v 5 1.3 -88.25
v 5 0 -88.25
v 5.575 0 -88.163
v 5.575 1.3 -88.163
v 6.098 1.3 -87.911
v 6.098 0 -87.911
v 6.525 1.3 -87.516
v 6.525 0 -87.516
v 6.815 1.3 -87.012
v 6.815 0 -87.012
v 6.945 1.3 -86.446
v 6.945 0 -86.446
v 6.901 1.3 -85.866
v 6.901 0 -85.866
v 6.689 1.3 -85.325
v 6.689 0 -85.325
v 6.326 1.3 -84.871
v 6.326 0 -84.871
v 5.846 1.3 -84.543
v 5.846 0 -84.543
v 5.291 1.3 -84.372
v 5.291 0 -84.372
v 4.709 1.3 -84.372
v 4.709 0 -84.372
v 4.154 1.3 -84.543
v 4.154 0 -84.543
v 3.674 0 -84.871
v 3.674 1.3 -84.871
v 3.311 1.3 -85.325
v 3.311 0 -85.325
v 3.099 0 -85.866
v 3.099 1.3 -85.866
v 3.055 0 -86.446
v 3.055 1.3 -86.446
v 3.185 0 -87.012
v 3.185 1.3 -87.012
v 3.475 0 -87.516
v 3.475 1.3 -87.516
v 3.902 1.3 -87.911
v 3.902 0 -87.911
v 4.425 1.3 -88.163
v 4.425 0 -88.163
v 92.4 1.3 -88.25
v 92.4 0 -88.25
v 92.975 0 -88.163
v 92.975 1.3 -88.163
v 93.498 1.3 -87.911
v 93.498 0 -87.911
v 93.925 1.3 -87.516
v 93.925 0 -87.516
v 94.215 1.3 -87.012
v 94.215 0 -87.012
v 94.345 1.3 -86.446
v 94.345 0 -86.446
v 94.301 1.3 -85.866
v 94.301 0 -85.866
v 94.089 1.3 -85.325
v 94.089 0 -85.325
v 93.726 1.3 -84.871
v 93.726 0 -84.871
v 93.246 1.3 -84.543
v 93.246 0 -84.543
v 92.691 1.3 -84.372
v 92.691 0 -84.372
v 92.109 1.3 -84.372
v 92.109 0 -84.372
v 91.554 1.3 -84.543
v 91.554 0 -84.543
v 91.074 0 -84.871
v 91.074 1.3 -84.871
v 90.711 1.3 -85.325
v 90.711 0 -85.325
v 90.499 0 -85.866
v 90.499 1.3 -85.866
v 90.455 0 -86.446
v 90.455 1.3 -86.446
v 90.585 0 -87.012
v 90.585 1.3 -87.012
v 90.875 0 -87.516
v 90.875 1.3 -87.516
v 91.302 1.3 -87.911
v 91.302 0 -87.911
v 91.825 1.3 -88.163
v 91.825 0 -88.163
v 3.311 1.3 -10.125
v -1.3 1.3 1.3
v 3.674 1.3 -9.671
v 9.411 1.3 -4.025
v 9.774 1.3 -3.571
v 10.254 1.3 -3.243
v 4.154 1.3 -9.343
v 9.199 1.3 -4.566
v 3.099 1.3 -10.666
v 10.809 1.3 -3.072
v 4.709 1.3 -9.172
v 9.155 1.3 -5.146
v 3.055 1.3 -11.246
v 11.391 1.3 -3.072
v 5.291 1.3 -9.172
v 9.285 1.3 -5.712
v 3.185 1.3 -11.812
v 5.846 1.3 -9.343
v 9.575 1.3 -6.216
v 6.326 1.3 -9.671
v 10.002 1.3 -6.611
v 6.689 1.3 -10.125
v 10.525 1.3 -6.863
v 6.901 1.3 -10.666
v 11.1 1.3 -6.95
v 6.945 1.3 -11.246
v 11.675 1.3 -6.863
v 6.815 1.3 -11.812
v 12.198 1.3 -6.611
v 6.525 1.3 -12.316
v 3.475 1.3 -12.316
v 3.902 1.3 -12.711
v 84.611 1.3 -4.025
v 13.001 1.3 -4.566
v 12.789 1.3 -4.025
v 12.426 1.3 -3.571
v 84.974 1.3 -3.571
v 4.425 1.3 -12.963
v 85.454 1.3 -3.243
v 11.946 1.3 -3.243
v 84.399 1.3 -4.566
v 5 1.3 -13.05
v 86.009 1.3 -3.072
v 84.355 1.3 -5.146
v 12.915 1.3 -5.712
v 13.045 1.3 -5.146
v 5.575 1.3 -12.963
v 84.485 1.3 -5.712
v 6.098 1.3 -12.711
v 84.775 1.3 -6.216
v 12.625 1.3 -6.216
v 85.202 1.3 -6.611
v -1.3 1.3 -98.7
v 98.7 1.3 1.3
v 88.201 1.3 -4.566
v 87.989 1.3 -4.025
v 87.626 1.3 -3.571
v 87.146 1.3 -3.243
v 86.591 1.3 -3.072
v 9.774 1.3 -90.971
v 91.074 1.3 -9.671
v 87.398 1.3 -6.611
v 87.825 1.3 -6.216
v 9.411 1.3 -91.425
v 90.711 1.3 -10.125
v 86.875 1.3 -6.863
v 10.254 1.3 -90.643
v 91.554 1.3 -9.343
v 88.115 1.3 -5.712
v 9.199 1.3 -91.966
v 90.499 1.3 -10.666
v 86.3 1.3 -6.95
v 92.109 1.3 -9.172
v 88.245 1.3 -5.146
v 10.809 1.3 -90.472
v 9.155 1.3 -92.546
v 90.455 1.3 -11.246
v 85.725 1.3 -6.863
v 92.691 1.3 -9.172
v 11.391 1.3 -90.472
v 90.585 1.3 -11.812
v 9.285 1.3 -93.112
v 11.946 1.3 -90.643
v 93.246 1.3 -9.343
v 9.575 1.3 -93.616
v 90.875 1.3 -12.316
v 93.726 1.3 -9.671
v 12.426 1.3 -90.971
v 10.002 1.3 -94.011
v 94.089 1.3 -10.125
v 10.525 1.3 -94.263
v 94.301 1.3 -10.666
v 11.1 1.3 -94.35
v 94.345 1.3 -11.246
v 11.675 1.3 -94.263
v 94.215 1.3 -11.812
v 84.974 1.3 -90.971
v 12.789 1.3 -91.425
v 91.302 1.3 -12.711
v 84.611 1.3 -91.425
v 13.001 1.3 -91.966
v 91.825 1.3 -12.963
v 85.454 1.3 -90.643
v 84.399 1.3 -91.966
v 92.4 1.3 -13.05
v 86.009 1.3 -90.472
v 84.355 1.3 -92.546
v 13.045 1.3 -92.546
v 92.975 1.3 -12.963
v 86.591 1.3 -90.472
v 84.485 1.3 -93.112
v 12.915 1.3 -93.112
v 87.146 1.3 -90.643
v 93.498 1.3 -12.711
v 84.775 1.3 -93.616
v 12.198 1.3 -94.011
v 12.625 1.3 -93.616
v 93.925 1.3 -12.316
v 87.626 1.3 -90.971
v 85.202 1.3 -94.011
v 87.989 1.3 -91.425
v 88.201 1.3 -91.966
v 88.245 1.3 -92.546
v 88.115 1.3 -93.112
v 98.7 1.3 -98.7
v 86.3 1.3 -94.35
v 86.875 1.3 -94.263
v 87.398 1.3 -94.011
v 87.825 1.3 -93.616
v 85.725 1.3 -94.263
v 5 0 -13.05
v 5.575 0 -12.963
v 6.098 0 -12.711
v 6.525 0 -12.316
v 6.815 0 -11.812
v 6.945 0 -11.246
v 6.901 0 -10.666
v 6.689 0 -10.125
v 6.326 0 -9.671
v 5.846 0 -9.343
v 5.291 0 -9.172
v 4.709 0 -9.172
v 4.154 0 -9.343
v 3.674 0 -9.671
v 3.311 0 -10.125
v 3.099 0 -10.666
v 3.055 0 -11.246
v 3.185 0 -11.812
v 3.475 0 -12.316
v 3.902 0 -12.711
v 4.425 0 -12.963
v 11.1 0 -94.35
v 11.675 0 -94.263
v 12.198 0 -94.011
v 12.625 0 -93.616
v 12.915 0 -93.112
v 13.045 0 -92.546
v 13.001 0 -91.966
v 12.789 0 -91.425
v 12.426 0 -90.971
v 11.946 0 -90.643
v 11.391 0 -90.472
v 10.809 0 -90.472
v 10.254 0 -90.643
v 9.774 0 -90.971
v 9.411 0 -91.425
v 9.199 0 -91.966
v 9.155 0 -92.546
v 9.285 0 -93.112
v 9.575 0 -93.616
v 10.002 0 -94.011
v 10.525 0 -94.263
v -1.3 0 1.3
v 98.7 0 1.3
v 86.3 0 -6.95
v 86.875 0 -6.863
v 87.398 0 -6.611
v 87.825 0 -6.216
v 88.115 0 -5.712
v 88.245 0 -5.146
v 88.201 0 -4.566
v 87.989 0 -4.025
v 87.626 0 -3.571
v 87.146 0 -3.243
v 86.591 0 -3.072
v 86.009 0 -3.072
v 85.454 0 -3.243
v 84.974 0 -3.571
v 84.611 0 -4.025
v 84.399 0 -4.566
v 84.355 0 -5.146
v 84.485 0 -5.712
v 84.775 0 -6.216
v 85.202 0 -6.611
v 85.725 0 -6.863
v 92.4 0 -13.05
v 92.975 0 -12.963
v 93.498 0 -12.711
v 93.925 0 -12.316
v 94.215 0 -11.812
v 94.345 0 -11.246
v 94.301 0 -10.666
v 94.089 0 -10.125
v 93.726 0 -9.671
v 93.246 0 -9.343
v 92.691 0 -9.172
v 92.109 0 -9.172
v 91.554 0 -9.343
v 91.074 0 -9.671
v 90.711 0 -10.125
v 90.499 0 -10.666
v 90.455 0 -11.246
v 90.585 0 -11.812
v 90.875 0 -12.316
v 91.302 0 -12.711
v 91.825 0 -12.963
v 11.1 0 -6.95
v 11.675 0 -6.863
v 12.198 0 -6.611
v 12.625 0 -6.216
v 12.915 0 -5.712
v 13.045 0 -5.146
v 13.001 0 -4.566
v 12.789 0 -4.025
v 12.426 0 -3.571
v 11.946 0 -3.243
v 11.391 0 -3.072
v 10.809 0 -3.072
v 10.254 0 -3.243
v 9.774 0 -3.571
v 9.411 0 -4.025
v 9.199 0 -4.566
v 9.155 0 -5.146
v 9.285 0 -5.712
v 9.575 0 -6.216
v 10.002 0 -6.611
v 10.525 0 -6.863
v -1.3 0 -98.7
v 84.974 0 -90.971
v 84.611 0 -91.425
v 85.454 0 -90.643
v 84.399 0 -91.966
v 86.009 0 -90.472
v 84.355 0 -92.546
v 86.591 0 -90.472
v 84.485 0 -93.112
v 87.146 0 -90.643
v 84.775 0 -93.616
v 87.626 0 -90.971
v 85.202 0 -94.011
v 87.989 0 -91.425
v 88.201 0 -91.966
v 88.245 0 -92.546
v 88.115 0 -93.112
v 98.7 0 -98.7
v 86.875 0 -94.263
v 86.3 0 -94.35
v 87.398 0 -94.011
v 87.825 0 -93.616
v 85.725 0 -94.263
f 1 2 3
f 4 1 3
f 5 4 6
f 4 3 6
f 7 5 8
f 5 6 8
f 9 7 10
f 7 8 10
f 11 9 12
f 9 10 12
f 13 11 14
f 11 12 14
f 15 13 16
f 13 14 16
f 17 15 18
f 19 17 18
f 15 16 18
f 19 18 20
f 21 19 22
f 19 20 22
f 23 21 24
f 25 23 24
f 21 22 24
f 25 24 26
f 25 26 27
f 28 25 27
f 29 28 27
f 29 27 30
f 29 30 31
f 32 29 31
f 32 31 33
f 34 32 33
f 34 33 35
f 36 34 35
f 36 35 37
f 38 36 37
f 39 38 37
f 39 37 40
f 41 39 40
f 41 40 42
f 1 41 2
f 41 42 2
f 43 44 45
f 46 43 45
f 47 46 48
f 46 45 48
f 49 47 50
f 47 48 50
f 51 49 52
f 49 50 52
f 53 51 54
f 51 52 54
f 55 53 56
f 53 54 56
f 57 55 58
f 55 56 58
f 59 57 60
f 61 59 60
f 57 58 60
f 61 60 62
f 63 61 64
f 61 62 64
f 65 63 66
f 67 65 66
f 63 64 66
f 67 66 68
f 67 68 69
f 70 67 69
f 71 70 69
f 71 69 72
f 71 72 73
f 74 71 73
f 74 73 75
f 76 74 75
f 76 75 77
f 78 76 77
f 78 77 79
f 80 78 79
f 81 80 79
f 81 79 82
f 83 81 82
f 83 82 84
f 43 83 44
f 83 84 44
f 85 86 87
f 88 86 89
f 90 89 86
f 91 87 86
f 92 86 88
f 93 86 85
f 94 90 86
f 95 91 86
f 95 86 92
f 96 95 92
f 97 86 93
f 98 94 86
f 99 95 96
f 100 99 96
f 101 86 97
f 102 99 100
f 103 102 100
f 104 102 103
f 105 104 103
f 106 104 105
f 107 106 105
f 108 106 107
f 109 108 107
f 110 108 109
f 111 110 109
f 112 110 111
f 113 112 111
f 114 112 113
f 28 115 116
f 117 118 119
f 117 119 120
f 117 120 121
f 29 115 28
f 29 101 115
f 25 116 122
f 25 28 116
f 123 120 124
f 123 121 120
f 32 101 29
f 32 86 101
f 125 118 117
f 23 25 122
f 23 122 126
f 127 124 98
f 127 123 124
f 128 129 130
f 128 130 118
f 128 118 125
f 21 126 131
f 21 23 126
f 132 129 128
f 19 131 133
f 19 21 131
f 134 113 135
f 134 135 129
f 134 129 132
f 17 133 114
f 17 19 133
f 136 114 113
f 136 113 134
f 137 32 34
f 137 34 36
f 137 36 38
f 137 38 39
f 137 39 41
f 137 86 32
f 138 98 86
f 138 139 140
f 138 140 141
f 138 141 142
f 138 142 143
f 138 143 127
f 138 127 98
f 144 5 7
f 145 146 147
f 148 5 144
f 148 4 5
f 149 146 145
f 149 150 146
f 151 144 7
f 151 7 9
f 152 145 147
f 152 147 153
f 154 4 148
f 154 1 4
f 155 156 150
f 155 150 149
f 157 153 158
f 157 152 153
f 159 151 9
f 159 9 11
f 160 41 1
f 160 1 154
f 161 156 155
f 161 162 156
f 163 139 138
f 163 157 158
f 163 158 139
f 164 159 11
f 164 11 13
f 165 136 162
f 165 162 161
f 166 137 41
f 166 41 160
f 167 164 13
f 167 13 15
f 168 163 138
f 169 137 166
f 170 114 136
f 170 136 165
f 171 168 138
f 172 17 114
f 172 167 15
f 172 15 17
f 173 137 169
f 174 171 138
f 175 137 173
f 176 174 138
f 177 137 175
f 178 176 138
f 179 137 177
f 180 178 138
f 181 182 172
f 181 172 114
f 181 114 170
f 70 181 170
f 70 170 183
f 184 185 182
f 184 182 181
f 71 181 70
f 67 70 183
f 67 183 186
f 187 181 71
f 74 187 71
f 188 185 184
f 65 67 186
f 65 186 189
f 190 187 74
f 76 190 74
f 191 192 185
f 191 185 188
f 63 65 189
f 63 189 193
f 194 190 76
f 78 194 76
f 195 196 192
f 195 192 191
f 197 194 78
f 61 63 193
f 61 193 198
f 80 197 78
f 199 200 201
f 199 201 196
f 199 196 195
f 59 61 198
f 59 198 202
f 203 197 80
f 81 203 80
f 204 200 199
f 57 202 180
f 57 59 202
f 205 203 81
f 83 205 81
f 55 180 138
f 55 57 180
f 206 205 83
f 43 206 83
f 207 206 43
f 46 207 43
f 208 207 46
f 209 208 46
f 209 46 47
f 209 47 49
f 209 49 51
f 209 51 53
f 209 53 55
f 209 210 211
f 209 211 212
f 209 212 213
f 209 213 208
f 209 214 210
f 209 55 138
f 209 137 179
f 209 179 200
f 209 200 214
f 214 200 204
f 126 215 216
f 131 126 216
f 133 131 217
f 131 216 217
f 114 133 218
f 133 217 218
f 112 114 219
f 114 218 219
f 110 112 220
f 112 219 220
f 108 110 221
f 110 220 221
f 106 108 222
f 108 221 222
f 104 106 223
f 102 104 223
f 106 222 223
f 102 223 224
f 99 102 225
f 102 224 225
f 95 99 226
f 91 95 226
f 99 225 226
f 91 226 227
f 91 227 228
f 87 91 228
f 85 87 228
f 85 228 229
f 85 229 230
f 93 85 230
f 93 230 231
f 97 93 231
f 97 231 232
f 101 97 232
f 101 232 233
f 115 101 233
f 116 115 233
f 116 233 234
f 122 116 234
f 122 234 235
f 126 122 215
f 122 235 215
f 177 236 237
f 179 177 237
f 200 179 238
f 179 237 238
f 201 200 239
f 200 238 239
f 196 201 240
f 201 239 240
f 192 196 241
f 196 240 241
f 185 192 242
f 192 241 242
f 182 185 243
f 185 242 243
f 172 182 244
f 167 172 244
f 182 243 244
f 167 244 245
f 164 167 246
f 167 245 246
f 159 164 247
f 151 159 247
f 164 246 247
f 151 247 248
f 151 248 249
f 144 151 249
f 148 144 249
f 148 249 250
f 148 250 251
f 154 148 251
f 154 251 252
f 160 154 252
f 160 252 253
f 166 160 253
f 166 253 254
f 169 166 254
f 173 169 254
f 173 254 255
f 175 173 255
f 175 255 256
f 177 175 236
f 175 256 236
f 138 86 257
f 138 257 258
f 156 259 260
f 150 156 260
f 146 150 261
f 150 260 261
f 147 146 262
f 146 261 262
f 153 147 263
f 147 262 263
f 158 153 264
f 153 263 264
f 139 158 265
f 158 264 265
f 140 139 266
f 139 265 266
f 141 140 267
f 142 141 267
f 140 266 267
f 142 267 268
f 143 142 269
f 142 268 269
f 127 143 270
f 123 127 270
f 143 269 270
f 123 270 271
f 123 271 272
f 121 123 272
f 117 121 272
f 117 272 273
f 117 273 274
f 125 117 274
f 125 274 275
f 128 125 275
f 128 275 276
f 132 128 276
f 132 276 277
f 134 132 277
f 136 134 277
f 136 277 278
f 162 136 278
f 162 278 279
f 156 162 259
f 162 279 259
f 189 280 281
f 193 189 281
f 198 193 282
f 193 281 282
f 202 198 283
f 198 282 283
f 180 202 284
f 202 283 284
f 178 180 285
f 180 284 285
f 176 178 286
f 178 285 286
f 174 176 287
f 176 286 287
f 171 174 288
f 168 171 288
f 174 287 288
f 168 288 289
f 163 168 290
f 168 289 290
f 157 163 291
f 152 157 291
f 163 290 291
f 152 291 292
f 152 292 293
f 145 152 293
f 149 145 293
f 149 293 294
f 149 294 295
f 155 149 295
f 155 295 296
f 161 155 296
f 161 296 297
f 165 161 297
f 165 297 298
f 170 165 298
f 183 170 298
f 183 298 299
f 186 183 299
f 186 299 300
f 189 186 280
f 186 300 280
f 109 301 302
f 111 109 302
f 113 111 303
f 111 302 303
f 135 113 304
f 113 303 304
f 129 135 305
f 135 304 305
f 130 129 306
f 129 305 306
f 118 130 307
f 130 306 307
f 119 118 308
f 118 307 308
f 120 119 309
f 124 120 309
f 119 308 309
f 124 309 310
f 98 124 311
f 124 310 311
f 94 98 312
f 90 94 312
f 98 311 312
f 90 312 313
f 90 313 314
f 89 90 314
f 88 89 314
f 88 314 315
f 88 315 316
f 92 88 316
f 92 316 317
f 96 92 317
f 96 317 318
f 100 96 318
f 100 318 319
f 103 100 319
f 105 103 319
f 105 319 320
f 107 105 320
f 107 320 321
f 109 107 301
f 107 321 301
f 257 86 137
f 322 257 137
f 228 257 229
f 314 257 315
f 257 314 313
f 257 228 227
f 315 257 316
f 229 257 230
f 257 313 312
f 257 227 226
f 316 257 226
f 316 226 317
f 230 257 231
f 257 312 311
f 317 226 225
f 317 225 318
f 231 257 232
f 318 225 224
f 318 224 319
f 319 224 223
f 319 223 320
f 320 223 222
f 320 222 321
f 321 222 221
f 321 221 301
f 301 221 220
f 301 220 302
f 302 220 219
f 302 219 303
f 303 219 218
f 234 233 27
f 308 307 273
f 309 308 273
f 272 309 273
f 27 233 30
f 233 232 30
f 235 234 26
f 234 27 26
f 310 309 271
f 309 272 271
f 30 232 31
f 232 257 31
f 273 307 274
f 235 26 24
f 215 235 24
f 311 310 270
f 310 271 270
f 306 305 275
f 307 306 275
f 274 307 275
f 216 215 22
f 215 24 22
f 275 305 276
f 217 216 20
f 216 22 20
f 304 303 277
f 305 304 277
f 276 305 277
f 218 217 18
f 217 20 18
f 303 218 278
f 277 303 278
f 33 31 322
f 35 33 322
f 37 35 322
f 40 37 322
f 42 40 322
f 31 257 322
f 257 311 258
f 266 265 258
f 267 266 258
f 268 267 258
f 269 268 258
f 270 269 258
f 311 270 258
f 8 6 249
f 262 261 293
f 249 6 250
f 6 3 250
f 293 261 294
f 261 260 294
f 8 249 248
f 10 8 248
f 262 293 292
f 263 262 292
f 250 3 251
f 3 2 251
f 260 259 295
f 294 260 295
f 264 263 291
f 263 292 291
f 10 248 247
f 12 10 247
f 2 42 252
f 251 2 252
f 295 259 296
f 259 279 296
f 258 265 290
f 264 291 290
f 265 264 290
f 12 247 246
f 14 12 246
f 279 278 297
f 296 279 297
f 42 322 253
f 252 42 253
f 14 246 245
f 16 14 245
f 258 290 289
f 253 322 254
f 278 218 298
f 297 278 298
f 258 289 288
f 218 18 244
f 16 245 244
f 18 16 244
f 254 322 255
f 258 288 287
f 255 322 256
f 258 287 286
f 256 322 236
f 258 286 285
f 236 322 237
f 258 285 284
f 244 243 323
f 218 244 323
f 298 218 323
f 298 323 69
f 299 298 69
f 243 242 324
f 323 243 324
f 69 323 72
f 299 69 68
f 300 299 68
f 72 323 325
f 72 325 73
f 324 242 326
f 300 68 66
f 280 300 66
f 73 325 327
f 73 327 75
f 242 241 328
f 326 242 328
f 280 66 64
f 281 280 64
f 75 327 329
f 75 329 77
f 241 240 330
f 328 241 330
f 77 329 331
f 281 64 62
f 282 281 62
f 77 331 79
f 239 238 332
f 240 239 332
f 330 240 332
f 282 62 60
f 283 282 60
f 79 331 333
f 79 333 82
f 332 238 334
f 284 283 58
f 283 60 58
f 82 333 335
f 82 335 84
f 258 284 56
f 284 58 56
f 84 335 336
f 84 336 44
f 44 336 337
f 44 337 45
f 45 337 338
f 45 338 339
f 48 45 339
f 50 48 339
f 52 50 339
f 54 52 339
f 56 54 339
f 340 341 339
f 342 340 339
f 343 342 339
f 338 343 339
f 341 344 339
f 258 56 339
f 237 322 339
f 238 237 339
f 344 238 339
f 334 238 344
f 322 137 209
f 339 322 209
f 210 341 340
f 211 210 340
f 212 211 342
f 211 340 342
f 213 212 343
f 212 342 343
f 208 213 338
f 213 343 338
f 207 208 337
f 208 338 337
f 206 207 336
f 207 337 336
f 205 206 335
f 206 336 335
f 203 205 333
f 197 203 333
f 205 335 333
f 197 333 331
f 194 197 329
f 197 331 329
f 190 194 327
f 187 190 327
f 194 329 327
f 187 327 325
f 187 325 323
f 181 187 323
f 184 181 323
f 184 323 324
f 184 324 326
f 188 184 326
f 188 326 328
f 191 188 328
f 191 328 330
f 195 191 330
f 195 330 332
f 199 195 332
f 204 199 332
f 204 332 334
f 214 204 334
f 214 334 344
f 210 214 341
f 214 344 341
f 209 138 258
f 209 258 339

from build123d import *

# Parameters (mm, degrees)
BOSS_EXTRUDE1_DEPTH = 1.3
SKETCH3_W           = 100
SKETCH3_H           = 100
BOSS_EXTRUDE3_DEPTH = 1.3
SKETCH2_R           = 1.95
CUT_EXTRUDE1_DEPTH  = 1.3


with BuildPart() as part:
    # Sketch1 → Boss-Extrude1 (new body)
    with BuildSketch(Plane(origin=(0, 0, 0), x_dir=(1, 0, 0), z_dir=(0, 1, 0))):
        Polygon((7.2, 7.2), (7.2, 0), (90.2, 0), (90.2, 7.2), (97.4, 7.2), (97.4, 90.2), (90.2, 90.2), (90.2, 97.4), (7.2, 97.4), (7.2, 90.2), (0, 90.2), (0, 7.2), align=None)
    extrude(amount=BOSS_EXTRUDE1_DEPTH)

    # Sketch3 → Boss-Extrude3 (add)
    with BuildSketch(Plane(origin=(0, 1.3, 0), x_dir=(1, 0, 0), z_dir=(0, 1, 0))):
        with Locations((48.7, 48.7)):
            Rectangle(SKETCH3_W, SKETCH3_H)
    extrude(amount=-BOSS_EXTRUDE3_DEPTH)

    # Sketch2 → Cut-Extrude1 (cut)
    with BuildSketch(Plane.XZ):
        with Locations(Location((92.4, -86.3, 0), (0, 0, 270))):
            Circle(SKETCH2_R)
        with Locations(Location((86.3, -92.4, 0), (0, 0, 270))):
            Circle(SKETCH2_R)
        with Locations(Location((11.1, -92.4, 0), (0, 0, 270))):
            Circle(SKETCH2_R)
        with Locations(Location((5, -86.3, 0), (0, 0, 270))):
            Circle(SKETCH2_R)
        with Locations(Location((5, -11.1, 0), (0, 0, 270))):
            Circle(SKETCH2_R)
        with Locations(Location((11.1, -5, 0), (0, 0, 270))):
            Circle(SKETCH2_R)
        with Locations(Location((86.3, -5, 0), (0, 0, 270))):
            Circle(SKETCH2_R)
        with Locations(Location((92.4, -11.1, 0), (0, 0, 270))):
            Circle(SKETCH2_R)
    extrude(amount=-CUT_EXTRUDE1_DEPTH, mode=Mode.SUBTRACT)


solid = part.part
